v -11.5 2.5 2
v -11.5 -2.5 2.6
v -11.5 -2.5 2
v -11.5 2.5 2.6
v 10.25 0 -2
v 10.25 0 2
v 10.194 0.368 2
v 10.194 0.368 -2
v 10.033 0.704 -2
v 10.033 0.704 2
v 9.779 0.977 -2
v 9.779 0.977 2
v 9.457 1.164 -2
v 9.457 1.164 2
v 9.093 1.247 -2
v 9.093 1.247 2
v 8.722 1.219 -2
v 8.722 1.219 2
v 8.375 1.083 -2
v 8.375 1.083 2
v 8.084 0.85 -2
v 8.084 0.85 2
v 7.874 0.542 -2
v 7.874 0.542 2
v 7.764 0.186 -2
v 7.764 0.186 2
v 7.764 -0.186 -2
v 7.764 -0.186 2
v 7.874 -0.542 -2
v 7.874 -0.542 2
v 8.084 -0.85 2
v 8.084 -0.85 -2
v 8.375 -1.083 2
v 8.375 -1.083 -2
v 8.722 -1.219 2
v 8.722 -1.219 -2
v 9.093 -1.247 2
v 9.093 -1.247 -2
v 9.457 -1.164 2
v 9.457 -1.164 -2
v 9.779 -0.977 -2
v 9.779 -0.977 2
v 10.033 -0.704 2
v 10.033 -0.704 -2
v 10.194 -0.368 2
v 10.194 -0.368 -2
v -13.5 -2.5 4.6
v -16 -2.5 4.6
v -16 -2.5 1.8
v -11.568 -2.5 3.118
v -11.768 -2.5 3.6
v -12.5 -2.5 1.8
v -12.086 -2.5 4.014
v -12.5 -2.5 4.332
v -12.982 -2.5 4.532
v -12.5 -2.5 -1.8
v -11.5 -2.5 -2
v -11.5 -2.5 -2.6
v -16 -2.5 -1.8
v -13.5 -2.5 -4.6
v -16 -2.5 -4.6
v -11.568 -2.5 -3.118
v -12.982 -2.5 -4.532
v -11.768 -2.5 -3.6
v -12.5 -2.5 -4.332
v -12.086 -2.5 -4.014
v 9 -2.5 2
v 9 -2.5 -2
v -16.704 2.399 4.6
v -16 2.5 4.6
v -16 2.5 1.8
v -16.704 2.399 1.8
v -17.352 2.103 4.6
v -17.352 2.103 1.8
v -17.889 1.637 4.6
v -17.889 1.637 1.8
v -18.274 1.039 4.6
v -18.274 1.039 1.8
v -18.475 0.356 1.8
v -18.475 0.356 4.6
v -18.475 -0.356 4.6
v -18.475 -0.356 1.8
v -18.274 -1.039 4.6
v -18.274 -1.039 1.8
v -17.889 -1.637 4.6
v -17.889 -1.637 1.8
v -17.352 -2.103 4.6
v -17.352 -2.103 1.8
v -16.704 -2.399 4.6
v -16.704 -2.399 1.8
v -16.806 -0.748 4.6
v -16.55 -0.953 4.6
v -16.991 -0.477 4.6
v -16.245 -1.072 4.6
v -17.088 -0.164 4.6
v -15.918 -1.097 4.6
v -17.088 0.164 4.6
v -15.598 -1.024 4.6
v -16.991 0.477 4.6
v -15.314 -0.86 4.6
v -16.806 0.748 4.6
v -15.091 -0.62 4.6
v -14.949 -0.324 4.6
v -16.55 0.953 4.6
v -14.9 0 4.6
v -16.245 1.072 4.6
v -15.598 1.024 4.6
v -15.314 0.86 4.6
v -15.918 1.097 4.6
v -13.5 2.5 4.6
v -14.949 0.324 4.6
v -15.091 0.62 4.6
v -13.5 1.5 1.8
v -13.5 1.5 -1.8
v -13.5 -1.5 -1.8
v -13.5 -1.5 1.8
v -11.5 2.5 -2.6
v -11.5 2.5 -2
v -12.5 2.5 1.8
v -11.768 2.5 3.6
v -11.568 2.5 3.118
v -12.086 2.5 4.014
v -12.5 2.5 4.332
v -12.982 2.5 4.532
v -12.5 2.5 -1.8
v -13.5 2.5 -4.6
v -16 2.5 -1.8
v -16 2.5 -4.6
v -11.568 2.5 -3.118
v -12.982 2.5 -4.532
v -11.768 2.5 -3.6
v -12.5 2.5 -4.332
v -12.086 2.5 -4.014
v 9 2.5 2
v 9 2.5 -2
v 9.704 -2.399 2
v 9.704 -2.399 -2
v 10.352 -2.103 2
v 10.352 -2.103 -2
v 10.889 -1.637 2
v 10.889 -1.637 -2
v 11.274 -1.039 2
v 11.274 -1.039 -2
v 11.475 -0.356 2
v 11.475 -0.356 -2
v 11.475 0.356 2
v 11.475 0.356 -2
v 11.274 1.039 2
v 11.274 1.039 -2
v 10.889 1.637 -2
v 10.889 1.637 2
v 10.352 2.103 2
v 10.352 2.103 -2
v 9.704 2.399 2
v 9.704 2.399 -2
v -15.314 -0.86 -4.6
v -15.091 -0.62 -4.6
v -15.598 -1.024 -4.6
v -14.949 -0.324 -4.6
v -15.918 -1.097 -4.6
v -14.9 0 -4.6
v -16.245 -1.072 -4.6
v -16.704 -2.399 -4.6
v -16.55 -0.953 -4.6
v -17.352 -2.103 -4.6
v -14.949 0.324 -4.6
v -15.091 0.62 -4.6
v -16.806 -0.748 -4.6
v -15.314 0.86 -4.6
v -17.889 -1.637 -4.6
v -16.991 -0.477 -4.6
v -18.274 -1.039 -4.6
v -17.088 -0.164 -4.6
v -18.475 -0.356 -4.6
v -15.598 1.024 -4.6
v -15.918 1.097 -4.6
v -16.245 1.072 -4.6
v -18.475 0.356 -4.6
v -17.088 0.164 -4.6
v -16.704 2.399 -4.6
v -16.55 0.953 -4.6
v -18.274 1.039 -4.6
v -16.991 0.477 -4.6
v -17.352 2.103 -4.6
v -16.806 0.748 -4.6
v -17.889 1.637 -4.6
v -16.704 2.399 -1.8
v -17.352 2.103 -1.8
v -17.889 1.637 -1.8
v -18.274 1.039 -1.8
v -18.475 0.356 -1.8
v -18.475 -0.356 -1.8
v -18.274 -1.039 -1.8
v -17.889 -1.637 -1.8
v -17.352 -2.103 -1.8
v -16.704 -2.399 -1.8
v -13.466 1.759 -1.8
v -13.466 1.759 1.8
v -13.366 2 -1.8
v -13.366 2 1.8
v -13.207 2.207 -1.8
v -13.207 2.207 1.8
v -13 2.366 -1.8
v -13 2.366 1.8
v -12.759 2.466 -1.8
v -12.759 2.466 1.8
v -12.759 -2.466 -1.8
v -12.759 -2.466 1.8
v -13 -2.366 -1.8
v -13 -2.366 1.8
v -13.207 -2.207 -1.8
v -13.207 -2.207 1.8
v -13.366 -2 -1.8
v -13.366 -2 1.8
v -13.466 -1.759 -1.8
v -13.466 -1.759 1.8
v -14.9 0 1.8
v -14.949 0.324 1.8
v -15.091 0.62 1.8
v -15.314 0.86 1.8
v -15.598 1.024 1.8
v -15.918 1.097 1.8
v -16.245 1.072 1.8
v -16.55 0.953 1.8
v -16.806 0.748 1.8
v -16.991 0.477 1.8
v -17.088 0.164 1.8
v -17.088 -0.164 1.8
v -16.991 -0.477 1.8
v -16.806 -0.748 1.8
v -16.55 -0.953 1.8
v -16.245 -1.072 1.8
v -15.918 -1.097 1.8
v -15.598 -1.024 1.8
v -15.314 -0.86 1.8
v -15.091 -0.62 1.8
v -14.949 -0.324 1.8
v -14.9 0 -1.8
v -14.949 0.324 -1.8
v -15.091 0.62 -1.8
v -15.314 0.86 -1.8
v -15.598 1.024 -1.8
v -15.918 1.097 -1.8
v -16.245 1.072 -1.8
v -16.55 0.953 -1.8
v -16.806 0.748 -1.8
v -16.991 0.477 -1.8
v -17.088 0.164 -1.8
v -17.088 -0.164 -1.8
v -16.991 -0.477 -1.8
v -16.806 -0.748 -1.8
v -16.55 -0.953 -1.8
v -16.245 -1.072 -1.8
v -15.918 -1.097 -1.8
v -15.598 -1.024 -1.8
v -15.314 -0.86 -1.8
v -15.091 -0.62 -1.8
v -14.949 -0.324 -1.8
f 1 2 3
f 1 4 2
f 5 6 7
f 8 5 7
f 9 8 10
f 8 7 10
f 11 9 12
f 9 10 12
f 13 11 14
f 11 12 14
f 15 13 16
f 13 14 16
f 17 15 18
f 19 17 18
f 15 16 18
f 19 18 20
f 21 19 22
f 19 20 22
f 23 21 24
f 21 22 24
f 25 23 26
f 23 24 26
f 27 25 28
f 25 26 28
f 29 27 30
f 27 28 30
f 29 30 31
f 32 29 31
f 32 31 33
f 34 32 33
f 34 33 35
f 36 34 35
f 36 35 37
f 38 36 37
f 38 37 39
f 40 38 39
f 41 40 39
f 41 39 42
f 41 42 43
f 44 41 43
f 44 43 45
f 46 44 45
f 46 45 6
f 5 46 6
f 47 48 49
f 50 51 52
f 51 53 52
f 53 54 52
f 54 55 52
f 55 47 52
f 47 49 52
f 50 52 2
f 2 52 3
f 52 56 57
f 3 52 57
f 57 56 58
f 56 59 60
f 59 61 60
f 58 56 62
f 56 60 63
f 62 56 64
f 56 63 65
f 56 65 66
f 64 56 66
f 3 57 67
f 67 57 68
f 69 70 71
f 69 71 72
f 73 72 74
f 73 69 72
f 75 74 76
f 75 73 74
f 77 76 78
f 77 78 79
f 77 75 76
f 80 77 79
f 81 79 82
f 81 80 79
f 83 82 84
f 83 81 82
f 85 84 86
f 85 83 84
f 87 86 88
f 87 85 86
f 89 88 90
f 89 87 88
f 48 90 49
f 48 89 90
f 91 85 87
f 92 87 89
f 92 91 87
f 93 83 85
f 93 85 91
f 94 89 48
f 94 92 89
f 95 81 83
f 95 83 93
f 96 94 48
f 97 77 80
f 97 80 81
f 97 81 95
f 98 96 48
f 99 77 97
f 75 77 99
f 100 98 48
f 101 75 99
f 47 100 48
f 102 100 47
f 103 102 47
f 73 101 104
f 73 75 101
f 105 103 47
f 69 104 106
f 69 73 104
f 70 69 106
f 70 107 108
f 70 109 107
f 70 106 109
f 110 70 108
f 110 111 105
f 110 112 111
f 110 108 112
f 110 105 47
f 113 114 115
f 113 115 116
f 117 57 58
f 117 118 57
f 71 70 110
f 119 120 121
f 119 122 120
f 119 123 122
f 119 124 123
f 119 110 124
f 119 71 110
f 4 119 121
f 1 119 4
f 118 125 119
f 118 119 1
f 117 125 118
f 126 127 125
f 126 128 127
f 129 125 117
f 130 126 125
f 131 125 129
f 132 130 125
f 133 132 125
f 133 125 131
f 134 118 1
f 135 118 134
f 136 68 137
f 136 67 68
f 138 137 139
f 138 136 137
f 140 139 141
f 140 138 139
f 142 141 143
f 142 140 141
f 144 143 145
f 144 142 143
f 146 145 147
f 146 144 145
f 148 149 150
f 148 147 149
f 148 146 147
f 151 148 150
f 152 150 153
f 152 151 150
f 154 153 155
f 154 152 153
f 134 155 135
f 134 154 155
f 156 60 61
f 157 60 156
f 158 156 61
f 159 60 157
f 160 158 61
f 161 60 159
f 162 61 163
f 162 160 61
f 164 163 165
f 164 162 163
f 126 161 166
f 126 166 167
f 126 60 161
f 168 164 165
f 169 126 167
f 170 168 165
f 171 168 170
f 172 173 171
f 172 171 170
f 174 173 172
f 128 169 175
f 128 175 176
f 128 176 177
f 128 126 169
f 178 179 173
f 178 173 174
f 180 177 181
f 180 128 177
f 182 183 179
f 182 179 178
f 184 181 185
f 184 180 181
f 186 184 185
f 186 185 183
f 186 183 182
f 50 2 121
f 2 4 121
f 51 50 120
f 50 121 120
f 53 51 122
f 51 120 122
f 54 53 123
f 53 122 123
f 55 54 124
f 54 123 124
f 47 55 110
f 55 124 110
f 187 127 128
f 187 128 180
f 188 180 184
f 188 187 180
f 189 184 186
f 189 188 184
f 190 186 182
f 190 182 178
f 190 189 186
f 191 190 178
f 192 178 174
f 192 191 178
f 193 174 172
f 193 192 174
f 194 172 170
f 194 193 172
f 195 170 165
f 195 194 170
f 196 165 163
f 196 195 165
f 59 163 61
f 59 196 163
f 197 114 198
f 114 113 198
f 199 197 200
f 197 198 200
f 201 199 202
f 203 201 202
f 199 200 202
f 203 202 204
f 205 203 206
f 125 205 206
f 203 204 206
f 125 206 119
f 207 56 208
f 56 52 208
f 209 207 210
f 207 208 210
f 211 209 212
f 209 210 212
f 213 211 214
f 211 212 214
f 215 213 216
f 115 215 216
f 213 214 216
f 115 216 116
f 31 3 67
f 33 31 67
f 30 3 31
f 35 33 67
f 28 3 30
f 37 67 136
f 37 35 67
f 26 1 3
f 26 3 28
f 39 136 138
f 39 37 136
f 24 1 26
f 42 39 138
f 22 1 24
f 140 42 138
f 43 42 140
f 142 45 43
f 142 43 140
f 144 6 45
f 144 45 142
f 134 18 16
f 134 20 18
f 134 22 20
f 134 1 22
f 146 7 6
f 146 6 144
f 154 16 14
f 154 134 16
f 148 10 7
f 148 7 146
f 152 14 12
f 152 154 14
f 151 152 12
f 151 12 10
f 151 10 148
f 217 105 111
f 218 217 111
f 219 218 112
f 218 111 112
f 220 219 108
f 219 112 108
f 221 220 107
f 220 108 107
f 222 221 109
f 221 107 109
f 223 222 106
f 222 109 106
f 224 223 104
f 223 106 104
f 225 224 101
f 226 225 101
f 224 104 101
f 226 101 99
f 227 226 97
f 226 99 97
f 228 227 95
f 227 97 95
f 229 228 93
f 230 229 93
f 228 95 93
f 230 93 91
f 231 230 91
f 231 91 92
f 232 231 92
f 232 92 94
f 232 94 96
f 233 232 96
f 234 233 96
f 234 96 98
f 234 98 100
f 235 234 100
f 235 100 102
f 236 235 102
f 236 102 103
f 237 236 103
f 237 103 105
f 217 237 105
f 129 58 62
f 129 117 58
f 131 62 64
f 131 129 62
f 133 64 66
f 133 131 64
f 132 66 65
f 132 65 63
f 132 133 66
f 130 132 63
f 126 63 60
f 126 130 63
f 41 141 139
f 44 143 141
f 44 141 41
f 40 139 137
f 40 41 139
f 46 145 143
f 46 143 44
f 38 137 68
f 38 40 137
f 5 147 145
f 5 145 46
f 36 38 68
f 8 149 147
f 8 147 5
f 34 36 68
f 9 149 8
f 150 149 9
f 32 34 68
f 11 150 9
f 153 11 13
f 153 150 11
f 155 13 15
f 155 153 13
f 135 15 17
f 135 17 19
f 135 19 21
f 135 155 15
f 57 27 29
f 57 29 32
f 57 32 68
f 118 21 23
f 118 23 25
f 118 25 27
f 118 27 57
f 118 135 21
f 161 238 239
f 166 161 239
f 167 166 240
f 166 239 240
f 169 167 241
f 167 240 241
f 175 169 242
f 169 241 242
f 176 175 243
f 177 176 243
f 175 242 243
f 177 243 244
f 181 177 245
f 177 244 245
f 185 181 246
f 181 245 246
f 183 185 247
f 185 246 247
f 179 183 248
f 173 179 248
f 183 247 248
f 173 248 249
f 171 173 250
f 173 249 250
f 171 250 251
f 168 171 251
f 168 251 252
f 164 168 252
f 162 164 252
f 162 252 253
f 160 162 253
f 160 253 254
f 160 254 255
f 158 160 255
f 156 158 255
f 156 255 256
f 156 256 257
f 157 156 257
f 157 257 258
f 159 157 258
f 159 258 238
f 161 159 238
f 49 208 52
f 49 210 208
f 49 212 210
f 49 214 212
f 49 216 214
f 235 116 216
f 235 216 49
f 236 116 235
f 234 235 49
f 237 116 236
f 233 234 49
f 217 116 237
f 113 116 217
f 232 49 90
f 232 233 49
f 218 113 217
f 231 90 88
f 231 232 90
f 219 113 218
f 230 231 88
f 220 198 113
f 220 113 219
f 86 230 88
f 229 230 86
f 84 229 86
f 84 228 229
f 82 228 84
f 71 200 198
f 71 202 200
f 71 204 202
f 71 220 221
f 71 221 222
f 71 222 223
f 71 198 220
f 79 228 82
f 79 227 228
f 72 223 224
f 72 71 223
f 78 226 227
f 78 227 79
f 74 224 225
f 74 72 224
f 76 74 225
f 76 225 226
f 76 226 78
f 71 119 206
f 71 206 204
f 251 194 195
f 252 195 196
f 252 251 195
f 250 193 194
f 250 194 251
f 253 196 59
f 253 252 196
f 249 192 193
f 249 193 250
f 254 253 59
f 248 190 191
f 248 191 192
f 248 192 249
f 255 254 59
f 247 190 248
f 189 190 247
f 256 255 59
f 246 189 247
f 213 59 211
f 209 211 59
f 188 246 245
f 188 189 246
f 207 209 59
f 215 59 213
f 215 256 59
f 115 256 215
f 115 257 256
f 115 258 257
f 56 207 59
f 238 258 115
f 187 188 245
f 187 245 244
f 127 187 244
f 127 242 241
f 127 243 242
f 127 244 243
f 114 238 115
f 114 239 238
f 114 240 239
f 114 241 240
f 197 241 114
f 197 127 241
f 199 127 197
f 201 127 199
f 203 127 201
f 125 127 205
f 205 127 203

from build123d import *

# Parameters (mm, degrees)
BOSS_EXTRUDE1_DEPTH = 2.5
SKETCH2_R           = 1.1
SKETCH2_R_2         = 1.25
CUT_EXTRUDE1_DEPTH  = 21.81201576
FILLET3_RADIUS      = 2.5
FILLET3_LENGTH      = 2.8
FILLET4_RADIUS      = 2.5
FILLET4_LENGTH      = 2.8
FILLET5_RADIUS      = 2.5
FILLET5_LENGTH      = 4
FILLET6_R           = 2
FILLET7_R           = 2
FILLET8_R           = 1


with BuildPart() as part:
    # Sketch1 → Boss-Extrude1 (new, symmetric)
    with BuildSketch(Plane(origin=(0, 0, 0), x_dir=(1, 0, 0), z_dir=(0, 1, 0))):
        Polygon((11.5, 2), (-11.5, 2), (-11.5, 4.6), (-18.5, 4.6), (-18.5, 1.8), (-13.5, 1.8), (-13.5, -1.8), (-18.5, -1.8), (-18.5, -4.6), (-11.5, -4.6), (-11.5, -2), (11.5, -2), align=None)
    extrude(amount=BOSS_EXTRUDE1_DEPTH, both=True)

    # Sketch2 → Cut-Extrude1 (cut, through all)
    with BuildSketch(Plane.XY.offset(4.6)):
        with Locations((-16, 0)):
            Circle(SKETCH2_R)
        with Locations((9, 0)):
            Circle(SKETCH2_R_2)
    extrude(amount=-CUT_EXTRUDE1_DEPTH, mode=Mode.SUBTRACT)

    # Fillet3: full round fillet: the end face becomes a half cylinder, R = half its width
    fillet3_face = Plane((-18.5, 0, -3.2), x_dir=(0, 0, 1), z_dir=(-1, 0, 0))  # on the end face: x along it, z out of the body
    fillet3_slab = fillet3_face.offset(-FILLET3_RADIUS / 2) * Box(FILLET3_LENGTH, 2 * FILLET3_RADIUS, FILLET3_RADIUS, mode=Mode.PRIVATE)  # the body's end, R deep
    fillet3_round = Plane((-16, 0, -3.2), x_dir=(-1, 0, 0), z_dir=(0, 0, 1)) * Cylinder(FILLET3_RADIUS, FILLET3_LENGTH, mode=Mode.PRIVATE)  # its axis R under the face
    add(fillet3_slab - fillet3_round, mode=Mode.SUBTRACT)

    # Fillet4: full round fillet: the end face becomes a half cylinder, R = half its width
    fillet4_face = Plane((-18.5, 0, 3.2), x_dir=(0, 0, 1), z_dir=(-1, 0, 0))  # on the end face: x along it, z out of the body
    fillet4_slab = fillet4_face.offset(-FILLET4_RADIUS / 2) * Box(FILLET4_LENGTH, 2 * FILLET4_RADIUS, FILLET4_RADIUS, mode=Mode.PRIVATE)  # the body's end, R deep
    fillet4_round = Plane((-16, 0, 3.2), x_dir=(-1, 0, 0), z_dir=(0, 0, 1)) * Cylinder(FILLET4_RADIUS, FILLET4_LENGTH, mode=Mode.PRIVATE)  # its axis R under the face
    add(fillet4_slab - fillet4_round, mode=Mode.SUBTRACT)

    # Fillet5: full round fillet: the end face becomes a half cylinder, R = half its width
    fillet5_face = Plane((11.5, 0, 0), x_dir=(0, 0, 1), z_dir=(1, 0, 0))  # on the end face: x along it, z out of the body
    fillet5_slab = fillet5_face.offset(-FILLET5_RADIUS / 2) * Box(FILLET5_LENGTH, 2 * FILLET5_RADIUS, FILLET5_RADIUS, mode=Mode.PRIVATE)  # the body's end, R deep
    fillet5_round = Plane((9, 0, 0), x_dir=(1, 0, 0), z_dir=(0, 0, 1)) * Cylinder(FILLET5_RADIUS, FILLET5_LENGTH, mode=Mode.PRIVATE)  # its axis R under the face
    add(fillet5_slab - fillet5_round, mode=Mode.SUBTRACT)

    # Fillet6
    fillet6_edges = [part.edges().sort_by_distance(p)[0] for p in [
        (-11.5, 0, 4.6),
    ]]
    fillet(fillet6_edges, radius=FILLET6_R)

    # Fillet7
    fillet7_edges = [part.edges().sort_by_distance(p)[0] for p in [
        (-11.5, 0, -4.6),
    ]]
    fillet(fillet7_edges, radius=FILLET7_R)

    # Fillet8
    fillet8_edges = [part.edges().sort_by_distance(p)[0] for p in [
        (-13.5, -2.5, 0),
        (-13.5, 2.5, 0),
    ]]
    fillet(fillet8_edges, radius=FILLET8_R)


solid = part.part
